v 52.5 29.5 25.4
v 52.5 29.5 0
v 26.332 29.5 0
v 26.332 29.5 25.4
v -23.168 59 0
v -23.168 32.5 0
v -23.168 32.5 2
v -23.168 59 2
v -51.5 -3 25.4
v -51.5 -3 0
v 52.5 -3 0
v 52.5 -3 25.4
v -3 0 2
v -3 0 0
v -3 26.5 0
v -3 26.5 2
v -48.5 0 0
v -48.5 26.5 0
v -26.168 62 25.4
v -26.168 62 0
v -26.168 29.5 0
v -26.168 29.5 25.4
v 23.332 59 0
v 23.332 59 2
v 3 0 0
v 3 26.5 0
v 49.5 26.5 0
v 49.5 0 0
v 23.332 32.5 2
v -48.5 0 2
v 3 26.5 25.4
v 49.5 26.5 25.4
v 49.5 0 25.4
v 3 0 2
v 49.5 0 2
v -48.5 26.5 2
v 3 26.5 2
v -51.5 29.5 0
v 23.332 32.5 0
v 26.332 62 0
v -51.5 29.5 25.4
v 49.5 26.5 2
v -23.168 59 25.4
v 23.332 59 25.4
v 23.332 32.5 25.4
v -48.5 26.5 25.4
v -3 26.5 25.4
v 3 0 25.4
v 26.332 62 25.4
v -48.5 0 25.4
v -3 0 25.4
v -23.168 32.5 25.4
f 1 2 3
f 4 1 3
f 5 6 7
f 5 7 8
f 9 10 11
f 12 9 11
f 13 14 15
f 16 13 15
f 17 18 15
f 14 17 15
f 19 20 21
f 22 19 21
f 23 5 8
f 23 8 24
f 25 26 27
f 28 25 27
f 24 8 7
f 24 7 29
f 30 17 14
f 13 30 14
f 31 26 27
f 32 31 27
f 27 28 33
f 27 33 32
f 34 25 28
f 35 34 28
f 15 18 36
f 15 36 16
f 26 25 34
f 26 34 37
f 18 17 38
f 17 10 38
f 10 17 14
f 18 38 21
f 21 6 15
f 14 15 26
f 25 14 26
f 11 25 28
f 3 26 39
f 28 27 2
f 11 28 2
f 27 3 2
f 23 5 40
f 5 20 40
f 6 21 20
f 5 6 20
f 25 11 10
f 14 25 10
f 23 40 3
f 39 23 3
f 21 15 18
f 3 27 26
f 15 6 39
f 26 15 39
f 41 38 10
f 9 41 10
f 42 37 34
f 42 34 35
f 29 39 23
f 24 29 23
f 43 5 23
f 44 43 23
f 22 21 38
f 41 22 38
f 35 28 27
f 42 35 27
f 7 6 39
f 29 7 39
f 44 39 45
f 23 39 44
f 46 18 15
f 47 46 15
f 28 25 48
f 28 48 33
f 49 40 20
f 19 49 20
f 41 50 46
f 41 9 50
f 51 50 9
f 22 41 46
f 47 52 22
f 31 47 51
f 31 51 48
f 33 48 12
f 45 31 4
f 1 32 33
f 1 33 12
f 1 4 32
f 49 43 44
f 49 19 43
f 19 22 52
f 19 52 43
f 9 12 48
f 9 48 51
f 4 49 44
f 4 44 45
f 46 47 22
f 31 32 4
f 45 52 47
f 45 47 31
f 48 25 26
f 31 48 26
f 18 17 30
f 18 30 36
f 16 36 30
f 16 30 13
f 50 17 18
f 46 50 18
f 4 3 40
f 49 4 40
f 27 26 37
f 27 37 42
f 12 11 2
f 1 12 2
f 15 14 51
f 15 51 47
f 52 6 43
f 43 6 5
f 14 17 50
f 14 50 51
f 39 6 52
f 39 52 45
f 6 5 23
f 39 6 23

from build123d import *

# Parameters (mm, degrees)
F0_W     = 45.5
F0_H     = 26.5
F0_W_2   = 46.5
F1_DEPTH = 2
F2_DEPTH = 25.4


with BuildPart() as f1:
    # F0 (on Top) → F1 (new body)
    with BuildSketch(Plane.XY):
        with Locations((-25.75, 13.25)):
            Rectangle(F0_W, F0_H)
        with Locations((26.25, 13.25)):
            Rectangle(F0_W_2, F0_H)
        with Locations((0.08165, 45.75)):
            Rectangle(F0_W_2, F0_H)
    extrude(amount=F1_DEPTH)


with BuildPart() as f2:
    # F0 (on Top) → F2 (new body)
    with BuildSketch(Plane.XY):
        Polygon((26.33165, 62), (0.08165, 62), (-23.16835, 62), (-26.16835, 62), (-26.16835, 32.5), (-26.16835, 29.5), (-51.5, 29.5), (-51.5, 26.5), (-51.5, -3), (-48.5, -3), (52.5, -3), (52.5, 0), (52.5, 29.5), (26.33165, 29.5), (26.33165, 32.5), align=None)
        with Locations((-25.75, 13.25)):
            Rectangle(F0_W, F0_H, mode=Mode.SUBTRACT)
        with Locations((26.25, 13.25)):
            Rectangle(F0_W_2, F0_H, mode=Mode.SUBTRACT)
        with Locations((0.08165, 45.75)):
            Rectangle(F0_W_2, F0_H, mode=Mode.SUBTRACT)
    extrude(amount=F2_DEPTH)


solid = Compound([f1.part, f2.part])
